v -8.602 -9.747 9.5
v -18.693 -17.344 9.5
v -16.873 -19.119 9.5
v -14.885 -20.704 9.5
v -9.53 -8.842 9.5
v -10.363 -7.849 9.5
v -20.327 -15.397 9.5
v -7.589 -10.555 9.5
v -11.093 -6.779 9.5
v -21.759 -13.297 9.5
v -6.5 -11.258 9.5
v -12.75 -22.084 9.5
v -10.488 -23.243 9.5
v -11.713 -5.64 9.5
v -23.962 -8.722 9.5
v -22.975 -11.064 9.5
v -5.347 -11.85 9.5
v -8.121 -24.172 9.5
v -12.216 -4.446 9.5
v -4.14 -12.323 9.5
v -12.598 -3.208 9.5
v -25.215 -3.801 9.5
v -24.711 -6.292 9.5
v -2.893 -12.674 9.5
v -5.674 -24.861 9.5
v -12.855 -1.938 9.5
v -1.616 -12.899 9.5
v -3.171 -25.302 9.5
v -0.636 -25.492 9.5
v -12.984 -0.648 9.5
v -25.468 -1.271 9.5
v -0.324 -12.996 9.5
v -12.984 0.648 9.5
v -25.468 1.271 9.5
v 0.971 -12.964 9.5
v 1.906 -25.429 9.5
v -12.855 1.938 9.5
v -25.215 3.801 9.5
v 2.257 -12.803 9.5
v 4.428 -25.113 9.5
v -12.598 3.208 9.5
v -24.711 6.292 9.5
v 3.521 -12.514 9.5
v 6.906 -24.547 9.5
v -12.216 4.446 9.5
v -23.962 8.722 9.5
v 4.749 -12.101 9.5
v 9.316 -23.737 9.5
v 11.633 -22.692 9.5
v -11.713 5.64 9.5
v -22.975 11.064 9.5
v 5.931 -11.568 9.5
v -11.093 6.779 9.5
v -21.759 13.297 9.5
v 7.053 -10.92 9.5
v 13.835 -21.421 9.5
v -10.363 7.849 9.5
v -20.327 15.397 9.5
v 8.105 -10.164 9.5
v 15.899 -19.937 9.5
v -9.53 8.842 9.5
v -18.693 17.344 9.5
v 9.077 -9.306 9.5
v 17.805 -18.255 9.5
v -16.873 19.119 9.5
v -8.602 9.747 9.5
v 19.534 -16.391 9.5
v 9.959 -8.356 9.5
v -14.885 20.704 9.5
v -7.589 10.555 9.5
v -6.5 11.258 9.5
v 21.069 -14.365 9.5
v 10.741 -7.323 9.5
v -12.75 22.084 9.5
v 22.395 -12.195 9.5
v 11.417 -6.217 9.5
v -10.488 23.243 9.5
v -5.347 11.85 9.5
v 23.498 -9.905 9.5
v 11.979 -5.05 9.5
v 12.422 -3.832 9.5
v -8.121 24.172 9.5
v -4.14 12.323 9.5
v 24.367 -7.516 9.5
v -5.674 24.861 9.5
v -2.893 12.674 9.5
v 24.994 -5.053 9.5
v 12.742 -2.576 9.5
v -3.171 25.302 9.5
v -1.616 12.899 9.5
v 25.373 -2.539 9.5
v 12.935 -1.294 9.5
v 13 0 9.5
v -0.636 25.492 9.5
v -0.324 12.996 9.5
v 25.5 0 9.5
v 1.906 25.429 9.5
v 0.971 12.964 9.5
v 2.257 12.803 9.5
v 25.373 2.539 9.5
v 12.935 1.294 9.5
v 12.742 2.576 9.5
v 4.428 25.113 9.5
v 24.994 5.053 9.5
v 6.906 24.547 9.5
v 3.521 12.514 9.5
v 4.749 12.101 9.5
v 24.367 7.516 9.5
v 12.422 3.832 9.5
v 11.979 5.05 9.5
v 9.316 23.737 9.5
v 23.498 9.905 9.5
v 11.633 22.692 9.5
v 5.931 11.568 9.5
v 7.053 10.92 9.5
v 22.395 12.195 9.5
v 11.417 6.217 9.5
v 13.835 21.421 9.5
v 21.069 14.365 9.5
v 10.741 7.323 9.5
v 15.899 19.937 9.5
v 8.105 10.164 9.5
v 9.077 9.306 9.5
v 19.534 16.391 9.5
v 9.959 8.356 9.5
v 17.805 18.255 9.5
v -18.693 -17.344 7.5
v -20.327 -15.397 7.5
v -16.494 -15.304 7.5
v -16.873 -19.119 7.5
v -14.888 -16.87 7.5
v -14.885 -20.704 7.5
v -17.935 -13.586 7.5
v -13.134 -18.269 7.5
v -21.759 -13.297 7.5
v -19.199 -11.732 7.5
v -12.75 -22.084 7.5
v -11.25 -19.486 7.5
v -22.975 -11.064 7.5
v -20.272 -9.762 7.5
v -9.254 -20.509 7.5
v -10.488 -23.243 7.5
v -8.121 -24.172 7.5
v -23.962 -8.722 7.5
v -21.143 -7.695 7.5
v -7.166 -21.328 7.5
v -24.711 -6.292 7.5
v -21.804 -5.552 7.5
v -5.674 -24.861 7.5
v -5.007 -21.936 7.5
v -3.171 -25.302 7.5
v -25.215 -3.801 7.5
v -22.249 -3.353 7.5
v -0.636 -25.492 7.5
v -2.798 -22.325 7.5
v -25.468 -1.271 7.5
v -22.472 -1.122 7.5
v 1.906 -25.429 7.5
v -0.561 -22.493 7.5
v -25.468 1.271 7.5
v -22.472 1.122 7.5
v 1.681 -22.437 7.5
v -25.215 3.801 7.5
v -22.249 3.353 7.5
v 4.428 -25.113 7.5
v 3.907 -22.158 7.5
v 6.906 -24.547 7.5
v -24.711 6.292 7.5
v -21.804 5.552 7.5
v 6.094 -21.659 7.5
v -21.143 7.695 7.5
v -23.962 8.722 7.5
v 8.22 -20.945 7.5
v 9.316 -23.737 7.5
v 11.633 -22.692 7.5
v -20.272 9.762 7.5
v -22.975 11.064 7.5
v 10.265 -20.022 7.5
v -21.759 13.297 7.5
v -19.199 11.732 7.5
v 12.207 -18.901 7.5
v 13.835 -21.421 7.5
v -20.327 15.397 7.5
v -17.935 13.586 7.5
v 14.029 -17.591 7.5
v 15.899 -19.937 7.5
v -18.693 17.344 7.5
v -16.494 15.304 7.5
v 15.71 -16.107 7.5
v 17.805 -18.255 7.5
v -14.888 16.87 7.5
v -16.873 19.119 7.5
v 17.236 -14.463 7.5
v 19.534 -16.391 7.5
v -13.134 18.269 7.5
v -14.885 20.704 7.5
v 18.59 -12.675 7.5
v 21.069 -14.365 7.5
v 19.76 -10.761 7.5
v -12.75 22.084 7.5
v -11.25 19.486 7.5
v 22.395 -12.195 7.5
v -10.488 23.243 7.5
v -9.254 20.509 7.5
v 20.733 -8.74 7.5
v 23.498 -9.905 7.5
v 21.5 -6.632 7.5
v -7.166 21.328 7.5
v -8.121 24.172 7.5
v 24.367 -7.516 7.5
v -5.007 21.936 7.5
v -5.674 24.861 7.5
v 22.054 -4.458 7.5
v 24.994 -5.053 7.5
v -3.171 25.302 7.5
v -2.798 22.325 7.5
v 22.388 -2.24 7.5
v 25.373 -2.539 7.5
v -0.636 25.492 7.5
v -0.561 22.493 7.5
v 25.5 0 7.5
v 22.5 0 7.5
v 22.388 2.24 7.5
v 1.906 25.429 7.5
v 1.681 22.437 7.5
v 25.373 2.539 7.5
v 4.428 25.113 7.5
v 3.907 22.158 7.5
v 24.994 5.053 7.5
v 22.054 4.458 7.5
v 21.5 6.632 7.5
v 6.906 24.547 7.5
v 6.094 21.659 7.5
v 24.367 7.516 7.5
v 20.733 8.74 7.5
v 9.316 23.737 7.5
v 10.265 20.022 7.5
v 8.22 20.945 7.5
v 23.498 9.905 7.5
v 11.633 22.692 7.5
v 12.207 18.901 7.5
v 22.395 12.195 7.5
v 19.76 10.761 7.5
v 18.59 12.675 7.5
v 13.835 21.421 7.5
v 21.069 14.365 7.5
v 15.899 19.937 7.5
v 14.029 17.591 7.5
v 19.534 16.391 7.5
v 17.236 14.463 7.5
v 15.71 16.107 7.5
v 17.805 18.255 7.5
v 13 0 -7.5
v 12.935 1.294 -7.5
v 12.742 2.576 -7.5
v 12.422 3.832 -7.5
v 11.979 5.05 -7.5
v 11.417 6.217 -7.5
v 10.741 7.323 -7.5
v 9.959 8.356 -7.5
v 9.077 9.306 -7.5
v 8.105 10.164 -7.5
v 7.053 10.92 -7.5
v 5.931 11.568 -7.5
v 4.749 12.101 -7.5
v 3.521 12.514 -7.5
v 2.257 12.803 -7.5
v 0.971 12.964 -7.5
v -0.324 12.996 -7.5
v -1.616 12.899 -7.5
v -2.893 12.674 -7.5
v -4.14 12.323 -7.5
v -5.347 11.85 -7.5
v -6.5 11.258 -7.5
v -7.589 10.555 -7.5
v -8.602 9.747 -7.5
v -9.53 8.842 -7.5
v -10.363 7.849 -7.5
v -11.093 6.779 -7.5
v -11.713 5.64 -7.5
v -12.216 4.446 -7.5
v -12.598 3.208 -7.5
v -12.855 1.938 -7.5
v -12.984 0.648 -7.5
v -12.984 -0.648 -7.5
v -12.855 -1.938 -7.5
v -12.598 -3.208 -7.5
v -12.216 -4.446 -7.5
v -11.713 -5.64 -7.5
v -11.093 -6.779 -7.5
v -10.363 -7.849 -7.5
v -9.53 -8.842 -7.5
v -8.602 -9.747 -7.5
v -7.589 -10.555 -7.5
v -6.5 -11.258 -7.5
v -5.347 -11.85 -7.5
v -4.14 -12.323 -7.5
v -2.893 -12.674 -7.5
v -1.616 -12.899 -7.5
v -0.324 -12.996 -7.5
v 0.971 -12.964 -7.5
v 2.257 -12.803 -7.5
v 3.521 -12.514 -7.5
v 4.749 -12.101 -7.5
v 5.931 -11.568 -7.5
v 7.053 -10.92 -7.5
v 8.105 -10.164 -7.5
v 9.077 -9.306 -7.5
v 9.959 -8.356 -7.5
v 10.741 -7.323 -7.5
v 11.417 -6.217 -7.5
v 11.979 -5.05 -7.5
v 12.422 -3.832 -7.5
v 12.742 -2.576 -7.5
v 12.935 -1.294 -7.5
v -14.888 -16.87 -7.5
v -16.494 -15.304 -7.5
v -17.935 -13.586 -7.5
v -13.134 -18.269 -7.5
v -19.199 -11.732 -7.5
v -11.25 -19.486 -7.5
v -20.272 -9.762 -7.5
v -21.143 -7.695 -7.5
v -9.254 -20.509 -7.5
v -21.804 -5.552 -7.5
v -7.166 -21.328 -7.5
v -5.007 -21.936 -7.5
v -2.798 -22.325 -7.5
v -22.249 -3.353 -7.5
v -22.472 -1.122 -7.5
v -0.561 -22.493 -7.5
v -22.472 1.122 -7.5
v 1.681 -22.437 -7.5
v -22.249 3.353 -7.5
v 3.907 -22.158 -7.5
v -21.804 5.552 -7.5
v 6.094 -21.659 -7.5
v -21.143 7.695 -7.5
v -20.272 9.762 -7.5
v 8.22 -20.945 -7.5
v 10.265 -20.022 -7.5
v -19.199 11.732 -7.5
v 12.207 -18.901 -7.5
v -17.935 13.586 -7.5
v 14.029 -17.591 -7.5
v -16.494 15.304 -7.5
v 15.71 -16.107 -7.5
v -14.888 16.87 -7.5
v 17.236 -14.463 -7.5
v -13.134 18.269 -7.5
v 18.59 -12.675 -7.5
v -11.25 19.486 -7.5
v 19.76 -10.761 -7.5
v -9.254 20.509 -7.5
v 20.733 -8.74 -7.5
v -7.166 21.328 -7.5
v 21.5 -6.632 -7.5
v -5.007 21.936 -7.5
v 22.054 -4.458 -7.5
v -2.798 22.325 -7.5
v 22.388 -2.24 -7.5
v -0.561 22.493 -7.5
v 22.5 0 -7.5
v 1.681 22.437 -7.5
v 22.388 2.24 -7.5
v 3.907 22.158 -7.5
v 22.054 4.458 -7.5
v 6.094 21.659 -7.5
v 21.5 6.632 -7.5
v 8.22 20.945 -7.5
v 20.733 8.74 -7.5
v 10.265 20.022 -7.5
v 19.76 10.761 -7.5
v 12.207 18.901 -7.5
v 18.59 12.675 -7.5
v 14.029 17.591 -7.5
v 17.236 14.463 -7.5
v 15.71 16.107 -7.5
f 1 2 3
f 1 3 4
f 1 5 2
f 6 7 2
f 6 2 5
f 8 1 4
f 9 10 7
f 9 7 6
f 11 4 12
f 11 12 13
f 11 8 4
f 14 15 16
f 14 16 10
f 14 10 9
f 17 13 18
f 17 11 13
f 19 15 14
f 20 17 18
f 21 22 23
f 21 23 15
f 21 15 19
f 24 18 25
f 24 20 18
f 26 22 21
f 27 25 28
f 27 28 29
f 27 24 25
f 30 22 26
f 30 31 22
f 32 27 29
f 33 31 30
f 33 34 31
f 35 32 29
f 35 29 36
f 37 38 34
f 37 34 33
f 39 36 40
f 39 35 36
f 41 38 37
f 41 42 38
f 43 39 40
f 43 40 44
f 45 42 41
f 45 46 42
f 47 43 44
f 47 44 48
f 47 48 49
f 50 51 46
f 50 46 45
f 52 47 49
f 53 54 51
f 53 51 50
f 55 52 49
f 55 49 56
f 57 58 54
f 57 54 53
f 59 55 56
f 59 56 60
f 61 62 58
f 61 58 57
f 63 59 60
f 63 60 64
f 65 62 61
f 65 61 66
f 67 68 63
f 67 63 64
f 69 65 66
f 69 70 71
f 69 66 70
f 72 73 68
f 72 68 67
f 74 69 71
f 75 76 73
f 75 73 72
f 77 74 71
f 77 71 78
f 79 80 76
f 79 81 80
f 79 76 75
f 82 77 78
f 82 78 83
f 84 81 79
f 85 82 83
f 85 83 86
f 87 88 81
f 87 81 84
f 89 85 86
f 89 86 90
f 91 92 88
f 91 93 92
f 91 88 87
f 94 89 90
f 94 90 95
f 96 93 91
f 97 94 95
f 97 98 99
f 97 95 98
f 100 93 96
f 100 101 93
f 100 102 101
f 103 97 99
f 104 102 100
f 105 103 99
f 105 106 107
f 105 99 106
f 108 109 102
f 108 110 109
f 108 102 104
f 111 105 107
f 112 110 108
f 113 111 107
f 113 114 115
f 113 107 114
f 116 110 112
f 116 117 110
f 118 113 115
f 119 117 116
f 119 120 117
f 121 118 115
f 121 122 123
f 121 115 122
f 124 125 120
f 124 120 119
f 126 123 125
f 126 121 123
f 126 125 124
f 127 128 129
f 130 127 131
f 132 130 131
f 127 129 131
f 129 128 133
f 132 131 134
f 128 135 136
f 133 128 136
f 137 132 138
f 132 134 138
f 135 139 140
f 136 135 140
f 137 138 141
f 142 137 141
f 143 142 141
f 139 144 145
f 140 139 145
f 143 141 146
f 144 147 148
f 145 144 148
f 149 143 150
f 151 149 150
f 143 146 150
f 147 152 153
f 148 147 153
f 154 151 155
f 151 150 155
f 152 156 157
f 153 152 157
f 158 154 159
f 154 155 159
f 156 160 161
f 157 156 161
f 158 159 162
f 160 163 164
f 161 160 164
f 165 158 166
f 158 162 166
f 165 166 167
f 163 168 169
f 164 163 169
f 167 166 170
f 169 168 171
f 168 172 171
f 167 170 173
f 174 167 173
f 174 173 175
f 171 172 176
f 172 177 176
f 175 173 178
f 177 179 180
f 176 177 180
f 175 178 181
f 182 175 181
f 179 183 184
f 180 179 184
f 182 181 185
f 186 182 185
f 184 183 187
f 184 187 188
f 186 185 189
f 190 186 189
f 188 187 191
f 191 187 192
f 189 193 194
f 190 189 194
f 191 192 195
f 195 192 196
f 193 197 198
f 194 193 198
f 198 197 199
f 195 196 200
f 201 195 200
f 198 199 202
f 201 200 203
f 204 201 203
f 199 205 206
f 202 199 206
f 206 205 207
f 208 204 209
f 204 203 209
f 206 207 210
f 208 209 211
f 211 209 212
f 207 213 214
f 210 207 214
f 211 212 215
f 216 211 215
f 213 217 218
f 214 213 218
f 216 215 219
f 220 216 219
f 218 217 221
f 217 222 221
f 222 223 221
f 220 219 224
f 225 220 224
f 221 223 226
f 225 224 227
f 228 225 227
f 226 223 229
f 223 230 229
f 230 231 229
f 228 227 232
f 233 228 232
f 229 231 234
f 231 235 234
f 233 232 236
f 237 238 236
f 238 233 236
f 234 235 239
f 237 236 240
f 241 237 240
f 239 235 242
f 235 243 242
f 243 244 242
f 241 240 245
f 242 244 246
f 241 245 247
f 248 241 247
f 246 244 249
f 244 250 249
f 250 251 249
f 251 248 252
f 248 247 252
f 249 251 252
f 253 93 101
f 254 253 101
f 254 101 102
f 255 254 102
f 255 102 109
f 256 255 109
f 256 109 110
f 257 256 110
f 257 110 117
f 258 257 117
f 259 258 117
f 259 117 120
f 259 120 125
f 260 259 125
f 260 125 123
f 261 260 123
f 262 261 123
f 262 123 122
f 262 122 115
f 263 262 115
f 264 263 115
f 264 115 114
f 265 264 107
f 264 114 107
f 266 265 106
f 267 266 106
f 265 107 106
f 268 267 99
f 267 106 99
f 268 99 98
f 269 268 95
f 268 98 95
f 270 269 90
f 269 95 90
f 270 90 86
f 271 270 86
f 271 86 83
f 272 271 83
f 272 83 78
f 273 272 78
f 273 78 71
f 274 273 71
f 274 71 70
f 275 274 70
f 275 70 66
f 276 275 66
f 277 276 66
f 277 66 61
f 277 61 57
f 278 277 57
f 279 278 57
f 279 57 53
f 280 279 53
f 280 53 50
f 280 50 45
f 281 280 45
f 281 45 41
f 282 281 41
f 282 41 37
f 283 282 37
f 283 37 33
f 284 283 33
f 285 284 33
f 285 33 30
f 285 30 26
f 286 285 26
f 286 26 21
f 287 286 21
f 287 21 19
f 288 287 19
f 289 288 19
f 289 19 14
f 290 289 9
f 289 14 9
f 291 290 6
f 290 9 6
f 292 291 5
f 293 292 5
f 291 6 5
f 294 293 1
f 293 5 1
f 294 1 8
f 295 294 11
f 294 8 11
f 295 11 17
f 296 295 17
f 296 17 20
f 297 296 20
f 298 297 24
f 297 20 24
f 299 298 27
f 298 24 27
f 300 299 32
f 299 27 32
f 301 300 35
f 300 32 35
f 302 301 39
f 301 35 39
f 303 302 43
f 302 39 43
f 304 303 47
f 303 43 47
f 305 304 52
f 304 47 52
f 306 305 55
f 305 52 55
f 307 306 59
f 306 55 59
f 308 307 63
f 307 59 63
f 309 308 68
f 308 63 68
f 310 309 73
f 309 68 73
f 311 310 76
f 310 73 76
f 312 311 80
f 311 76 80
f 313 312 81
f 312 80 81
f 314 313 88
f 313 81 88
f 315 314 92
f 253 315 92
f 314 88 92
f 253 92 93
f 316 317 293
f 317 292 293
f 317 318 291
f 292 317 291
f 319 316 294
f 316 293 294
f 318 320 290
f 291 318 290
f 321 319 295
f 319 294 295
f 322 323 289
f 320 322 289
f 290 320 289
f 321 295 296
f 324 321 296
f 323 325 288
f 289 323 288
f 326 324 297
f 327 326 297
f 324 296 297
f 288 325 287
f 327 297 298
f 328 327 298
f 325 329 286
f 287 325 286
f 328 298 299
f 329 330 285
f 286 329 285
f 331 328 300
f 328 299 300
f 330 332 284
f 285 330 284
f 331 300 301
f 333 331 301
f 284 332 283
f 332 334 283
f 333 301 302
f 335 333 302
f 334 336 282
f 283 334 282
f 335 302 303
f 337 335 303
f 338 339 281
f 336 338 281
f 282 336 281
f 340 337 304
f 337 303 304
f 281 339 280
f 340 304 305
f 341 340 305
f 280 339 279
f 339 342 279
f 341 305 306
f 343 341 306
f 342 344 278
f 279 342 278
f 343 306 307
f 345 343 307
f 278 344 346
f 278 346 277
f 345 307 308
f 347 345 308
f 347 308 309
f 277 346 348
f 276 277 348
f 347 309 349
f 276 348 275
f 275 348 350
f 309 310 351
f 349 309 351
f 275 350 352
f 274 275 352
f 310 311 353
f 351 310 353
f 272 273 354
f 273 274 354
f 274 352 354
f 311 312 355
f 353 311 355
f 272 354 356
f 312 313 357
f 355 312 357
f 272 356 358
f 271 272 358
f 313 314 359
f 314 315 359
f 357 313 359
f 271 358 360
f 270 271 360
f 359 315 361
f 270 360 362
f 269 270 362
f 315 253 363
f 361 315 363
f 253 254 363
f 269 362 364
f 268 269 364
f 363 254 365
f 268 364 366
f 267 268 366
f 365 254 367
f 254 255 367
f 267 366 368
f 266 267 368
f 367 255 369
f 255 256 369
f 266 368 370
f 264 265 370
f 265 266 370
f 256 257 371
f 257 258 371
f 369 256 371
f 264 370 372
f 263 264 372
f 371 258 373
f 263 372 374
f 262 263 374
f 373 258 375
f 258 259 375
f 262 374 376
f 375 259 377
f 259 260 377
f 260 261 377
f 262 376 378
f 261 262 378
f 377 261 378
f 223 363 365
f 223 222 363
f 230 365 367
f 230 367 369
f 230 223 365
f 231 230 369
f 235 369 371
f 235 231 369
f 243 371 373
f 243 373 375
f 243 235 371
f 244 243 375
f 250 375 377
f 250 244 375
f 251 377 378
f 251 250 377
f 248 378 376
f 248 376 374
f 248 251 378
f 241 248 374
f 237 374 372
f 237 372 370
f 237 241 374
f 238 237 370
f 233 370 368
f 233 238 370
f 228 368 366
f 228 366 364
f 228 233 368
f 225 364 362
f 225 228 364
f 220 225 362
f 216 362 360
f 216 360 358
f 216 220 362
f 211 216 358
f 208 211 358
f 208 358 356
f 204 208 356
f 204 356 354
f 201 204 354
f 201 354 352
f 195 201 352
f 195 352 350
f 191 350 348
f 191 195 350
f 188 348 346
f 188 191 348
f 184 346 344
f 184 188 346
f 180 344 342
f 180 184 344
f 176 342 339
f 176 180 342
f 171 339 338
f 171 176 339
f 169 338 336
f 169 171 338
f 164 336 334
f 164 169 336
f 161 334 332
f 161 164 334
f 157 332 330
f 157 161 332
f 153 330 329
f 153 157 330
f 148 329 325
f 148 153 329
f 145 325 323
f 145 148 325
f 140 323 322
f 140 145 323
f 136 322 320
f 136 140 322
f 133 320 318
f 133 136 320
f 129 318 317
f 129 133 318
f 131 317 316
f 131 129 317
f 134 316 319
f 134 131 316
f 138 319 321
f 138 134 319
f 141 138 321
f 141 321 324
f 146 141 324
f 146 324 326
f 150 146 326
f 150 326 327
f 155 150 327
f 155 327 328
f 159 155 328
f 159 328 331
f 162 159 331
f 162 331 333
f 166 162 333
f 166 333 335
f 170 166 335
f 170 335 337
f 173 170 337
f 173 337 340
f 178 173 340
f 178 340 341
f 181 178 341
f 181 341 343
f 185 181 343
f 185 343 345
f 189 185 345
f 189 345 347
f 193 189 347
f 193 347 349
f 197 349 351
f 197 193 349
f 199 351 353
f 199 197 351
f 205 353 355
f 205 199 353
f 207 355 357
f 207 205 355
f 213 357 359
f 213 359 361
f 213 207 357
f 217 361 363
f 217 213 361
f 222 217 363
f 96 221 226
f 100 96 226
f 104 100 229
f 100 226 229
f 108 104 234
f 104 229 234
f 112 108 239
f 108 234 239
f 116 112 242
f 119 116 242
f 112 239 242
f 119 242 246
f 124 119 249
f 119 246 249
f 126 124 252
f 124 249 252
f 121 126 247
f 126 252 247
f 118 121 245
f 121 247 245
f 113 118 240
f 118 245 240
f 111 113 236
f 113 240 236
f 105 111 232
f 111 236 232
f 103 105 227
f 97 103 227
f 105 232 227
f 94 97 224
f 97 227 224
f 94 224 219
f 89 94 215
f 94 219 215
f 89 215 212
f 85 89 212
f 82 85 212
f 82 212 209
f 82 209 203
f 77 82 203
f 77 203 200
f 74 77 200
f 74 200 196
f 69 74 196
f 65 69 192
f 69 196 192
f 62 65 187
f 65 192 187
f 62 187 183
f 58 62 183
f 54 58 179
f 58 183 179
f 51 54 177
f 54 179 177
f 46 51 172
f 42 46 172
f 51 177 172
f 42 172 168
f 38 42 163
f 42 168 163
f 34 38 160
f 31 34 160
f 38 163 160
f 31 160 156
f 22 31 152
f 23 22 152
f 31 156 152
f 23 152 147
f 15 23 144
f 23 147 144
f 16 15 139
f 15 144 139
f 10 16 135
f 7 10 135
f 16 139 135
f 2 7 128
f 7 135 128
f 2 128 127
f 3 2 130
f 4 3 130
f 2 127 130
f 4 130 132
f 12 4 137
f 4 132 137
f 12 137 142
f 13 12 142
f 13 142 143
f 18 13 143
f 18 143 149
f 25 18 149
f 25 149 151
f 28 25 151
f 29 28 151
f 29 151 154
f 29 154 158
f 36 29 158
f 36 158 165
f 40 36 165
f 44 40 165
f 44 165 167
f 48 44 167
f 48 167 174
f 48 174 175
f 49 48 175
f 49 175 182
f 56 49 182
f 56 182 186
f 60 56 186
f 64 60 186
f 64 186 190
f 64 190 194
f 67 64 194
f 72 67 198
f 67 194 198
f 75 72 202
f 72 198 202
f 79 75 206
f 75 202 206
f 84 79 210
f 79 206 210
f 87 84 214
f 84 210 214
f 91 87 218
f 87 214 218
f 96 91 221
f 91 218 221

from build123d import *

# Parameters (mm, degrees)
SKETCH_R     = 22.5
PAD_DEPTH    = 7.5
SKETCH001_R  = 25.5
PAD001_DEPTH = 2
SKETCH002_R  = 13
POCKET_DEPTH = 44.501


with BuildPart() as part:
    # Sketch → Pad (new body, symmetric)
    with BuildSketch(Plane.XY):
        Circle(SKETCH_R)
    extrude(amount=PAD_DEPTH, both=True)

    # Sketch001 (on Face3 of Pad) → Pad001 (join)
    with BuildSketch(Plane.XY.offset(7.5)):
        Circle(SKETCH001_R)
    extrude(amount=PAD001_DEPTH)

    # Sketch002 → Pocket (cut, through all)
    with BuildSketch(Plane.XY.offset(37)):
        Circle(SKETCH002_R)
    extrude(amount=-POCKET_DEPTH, mode=Mode.SUBTRACT)


solid = part.part
